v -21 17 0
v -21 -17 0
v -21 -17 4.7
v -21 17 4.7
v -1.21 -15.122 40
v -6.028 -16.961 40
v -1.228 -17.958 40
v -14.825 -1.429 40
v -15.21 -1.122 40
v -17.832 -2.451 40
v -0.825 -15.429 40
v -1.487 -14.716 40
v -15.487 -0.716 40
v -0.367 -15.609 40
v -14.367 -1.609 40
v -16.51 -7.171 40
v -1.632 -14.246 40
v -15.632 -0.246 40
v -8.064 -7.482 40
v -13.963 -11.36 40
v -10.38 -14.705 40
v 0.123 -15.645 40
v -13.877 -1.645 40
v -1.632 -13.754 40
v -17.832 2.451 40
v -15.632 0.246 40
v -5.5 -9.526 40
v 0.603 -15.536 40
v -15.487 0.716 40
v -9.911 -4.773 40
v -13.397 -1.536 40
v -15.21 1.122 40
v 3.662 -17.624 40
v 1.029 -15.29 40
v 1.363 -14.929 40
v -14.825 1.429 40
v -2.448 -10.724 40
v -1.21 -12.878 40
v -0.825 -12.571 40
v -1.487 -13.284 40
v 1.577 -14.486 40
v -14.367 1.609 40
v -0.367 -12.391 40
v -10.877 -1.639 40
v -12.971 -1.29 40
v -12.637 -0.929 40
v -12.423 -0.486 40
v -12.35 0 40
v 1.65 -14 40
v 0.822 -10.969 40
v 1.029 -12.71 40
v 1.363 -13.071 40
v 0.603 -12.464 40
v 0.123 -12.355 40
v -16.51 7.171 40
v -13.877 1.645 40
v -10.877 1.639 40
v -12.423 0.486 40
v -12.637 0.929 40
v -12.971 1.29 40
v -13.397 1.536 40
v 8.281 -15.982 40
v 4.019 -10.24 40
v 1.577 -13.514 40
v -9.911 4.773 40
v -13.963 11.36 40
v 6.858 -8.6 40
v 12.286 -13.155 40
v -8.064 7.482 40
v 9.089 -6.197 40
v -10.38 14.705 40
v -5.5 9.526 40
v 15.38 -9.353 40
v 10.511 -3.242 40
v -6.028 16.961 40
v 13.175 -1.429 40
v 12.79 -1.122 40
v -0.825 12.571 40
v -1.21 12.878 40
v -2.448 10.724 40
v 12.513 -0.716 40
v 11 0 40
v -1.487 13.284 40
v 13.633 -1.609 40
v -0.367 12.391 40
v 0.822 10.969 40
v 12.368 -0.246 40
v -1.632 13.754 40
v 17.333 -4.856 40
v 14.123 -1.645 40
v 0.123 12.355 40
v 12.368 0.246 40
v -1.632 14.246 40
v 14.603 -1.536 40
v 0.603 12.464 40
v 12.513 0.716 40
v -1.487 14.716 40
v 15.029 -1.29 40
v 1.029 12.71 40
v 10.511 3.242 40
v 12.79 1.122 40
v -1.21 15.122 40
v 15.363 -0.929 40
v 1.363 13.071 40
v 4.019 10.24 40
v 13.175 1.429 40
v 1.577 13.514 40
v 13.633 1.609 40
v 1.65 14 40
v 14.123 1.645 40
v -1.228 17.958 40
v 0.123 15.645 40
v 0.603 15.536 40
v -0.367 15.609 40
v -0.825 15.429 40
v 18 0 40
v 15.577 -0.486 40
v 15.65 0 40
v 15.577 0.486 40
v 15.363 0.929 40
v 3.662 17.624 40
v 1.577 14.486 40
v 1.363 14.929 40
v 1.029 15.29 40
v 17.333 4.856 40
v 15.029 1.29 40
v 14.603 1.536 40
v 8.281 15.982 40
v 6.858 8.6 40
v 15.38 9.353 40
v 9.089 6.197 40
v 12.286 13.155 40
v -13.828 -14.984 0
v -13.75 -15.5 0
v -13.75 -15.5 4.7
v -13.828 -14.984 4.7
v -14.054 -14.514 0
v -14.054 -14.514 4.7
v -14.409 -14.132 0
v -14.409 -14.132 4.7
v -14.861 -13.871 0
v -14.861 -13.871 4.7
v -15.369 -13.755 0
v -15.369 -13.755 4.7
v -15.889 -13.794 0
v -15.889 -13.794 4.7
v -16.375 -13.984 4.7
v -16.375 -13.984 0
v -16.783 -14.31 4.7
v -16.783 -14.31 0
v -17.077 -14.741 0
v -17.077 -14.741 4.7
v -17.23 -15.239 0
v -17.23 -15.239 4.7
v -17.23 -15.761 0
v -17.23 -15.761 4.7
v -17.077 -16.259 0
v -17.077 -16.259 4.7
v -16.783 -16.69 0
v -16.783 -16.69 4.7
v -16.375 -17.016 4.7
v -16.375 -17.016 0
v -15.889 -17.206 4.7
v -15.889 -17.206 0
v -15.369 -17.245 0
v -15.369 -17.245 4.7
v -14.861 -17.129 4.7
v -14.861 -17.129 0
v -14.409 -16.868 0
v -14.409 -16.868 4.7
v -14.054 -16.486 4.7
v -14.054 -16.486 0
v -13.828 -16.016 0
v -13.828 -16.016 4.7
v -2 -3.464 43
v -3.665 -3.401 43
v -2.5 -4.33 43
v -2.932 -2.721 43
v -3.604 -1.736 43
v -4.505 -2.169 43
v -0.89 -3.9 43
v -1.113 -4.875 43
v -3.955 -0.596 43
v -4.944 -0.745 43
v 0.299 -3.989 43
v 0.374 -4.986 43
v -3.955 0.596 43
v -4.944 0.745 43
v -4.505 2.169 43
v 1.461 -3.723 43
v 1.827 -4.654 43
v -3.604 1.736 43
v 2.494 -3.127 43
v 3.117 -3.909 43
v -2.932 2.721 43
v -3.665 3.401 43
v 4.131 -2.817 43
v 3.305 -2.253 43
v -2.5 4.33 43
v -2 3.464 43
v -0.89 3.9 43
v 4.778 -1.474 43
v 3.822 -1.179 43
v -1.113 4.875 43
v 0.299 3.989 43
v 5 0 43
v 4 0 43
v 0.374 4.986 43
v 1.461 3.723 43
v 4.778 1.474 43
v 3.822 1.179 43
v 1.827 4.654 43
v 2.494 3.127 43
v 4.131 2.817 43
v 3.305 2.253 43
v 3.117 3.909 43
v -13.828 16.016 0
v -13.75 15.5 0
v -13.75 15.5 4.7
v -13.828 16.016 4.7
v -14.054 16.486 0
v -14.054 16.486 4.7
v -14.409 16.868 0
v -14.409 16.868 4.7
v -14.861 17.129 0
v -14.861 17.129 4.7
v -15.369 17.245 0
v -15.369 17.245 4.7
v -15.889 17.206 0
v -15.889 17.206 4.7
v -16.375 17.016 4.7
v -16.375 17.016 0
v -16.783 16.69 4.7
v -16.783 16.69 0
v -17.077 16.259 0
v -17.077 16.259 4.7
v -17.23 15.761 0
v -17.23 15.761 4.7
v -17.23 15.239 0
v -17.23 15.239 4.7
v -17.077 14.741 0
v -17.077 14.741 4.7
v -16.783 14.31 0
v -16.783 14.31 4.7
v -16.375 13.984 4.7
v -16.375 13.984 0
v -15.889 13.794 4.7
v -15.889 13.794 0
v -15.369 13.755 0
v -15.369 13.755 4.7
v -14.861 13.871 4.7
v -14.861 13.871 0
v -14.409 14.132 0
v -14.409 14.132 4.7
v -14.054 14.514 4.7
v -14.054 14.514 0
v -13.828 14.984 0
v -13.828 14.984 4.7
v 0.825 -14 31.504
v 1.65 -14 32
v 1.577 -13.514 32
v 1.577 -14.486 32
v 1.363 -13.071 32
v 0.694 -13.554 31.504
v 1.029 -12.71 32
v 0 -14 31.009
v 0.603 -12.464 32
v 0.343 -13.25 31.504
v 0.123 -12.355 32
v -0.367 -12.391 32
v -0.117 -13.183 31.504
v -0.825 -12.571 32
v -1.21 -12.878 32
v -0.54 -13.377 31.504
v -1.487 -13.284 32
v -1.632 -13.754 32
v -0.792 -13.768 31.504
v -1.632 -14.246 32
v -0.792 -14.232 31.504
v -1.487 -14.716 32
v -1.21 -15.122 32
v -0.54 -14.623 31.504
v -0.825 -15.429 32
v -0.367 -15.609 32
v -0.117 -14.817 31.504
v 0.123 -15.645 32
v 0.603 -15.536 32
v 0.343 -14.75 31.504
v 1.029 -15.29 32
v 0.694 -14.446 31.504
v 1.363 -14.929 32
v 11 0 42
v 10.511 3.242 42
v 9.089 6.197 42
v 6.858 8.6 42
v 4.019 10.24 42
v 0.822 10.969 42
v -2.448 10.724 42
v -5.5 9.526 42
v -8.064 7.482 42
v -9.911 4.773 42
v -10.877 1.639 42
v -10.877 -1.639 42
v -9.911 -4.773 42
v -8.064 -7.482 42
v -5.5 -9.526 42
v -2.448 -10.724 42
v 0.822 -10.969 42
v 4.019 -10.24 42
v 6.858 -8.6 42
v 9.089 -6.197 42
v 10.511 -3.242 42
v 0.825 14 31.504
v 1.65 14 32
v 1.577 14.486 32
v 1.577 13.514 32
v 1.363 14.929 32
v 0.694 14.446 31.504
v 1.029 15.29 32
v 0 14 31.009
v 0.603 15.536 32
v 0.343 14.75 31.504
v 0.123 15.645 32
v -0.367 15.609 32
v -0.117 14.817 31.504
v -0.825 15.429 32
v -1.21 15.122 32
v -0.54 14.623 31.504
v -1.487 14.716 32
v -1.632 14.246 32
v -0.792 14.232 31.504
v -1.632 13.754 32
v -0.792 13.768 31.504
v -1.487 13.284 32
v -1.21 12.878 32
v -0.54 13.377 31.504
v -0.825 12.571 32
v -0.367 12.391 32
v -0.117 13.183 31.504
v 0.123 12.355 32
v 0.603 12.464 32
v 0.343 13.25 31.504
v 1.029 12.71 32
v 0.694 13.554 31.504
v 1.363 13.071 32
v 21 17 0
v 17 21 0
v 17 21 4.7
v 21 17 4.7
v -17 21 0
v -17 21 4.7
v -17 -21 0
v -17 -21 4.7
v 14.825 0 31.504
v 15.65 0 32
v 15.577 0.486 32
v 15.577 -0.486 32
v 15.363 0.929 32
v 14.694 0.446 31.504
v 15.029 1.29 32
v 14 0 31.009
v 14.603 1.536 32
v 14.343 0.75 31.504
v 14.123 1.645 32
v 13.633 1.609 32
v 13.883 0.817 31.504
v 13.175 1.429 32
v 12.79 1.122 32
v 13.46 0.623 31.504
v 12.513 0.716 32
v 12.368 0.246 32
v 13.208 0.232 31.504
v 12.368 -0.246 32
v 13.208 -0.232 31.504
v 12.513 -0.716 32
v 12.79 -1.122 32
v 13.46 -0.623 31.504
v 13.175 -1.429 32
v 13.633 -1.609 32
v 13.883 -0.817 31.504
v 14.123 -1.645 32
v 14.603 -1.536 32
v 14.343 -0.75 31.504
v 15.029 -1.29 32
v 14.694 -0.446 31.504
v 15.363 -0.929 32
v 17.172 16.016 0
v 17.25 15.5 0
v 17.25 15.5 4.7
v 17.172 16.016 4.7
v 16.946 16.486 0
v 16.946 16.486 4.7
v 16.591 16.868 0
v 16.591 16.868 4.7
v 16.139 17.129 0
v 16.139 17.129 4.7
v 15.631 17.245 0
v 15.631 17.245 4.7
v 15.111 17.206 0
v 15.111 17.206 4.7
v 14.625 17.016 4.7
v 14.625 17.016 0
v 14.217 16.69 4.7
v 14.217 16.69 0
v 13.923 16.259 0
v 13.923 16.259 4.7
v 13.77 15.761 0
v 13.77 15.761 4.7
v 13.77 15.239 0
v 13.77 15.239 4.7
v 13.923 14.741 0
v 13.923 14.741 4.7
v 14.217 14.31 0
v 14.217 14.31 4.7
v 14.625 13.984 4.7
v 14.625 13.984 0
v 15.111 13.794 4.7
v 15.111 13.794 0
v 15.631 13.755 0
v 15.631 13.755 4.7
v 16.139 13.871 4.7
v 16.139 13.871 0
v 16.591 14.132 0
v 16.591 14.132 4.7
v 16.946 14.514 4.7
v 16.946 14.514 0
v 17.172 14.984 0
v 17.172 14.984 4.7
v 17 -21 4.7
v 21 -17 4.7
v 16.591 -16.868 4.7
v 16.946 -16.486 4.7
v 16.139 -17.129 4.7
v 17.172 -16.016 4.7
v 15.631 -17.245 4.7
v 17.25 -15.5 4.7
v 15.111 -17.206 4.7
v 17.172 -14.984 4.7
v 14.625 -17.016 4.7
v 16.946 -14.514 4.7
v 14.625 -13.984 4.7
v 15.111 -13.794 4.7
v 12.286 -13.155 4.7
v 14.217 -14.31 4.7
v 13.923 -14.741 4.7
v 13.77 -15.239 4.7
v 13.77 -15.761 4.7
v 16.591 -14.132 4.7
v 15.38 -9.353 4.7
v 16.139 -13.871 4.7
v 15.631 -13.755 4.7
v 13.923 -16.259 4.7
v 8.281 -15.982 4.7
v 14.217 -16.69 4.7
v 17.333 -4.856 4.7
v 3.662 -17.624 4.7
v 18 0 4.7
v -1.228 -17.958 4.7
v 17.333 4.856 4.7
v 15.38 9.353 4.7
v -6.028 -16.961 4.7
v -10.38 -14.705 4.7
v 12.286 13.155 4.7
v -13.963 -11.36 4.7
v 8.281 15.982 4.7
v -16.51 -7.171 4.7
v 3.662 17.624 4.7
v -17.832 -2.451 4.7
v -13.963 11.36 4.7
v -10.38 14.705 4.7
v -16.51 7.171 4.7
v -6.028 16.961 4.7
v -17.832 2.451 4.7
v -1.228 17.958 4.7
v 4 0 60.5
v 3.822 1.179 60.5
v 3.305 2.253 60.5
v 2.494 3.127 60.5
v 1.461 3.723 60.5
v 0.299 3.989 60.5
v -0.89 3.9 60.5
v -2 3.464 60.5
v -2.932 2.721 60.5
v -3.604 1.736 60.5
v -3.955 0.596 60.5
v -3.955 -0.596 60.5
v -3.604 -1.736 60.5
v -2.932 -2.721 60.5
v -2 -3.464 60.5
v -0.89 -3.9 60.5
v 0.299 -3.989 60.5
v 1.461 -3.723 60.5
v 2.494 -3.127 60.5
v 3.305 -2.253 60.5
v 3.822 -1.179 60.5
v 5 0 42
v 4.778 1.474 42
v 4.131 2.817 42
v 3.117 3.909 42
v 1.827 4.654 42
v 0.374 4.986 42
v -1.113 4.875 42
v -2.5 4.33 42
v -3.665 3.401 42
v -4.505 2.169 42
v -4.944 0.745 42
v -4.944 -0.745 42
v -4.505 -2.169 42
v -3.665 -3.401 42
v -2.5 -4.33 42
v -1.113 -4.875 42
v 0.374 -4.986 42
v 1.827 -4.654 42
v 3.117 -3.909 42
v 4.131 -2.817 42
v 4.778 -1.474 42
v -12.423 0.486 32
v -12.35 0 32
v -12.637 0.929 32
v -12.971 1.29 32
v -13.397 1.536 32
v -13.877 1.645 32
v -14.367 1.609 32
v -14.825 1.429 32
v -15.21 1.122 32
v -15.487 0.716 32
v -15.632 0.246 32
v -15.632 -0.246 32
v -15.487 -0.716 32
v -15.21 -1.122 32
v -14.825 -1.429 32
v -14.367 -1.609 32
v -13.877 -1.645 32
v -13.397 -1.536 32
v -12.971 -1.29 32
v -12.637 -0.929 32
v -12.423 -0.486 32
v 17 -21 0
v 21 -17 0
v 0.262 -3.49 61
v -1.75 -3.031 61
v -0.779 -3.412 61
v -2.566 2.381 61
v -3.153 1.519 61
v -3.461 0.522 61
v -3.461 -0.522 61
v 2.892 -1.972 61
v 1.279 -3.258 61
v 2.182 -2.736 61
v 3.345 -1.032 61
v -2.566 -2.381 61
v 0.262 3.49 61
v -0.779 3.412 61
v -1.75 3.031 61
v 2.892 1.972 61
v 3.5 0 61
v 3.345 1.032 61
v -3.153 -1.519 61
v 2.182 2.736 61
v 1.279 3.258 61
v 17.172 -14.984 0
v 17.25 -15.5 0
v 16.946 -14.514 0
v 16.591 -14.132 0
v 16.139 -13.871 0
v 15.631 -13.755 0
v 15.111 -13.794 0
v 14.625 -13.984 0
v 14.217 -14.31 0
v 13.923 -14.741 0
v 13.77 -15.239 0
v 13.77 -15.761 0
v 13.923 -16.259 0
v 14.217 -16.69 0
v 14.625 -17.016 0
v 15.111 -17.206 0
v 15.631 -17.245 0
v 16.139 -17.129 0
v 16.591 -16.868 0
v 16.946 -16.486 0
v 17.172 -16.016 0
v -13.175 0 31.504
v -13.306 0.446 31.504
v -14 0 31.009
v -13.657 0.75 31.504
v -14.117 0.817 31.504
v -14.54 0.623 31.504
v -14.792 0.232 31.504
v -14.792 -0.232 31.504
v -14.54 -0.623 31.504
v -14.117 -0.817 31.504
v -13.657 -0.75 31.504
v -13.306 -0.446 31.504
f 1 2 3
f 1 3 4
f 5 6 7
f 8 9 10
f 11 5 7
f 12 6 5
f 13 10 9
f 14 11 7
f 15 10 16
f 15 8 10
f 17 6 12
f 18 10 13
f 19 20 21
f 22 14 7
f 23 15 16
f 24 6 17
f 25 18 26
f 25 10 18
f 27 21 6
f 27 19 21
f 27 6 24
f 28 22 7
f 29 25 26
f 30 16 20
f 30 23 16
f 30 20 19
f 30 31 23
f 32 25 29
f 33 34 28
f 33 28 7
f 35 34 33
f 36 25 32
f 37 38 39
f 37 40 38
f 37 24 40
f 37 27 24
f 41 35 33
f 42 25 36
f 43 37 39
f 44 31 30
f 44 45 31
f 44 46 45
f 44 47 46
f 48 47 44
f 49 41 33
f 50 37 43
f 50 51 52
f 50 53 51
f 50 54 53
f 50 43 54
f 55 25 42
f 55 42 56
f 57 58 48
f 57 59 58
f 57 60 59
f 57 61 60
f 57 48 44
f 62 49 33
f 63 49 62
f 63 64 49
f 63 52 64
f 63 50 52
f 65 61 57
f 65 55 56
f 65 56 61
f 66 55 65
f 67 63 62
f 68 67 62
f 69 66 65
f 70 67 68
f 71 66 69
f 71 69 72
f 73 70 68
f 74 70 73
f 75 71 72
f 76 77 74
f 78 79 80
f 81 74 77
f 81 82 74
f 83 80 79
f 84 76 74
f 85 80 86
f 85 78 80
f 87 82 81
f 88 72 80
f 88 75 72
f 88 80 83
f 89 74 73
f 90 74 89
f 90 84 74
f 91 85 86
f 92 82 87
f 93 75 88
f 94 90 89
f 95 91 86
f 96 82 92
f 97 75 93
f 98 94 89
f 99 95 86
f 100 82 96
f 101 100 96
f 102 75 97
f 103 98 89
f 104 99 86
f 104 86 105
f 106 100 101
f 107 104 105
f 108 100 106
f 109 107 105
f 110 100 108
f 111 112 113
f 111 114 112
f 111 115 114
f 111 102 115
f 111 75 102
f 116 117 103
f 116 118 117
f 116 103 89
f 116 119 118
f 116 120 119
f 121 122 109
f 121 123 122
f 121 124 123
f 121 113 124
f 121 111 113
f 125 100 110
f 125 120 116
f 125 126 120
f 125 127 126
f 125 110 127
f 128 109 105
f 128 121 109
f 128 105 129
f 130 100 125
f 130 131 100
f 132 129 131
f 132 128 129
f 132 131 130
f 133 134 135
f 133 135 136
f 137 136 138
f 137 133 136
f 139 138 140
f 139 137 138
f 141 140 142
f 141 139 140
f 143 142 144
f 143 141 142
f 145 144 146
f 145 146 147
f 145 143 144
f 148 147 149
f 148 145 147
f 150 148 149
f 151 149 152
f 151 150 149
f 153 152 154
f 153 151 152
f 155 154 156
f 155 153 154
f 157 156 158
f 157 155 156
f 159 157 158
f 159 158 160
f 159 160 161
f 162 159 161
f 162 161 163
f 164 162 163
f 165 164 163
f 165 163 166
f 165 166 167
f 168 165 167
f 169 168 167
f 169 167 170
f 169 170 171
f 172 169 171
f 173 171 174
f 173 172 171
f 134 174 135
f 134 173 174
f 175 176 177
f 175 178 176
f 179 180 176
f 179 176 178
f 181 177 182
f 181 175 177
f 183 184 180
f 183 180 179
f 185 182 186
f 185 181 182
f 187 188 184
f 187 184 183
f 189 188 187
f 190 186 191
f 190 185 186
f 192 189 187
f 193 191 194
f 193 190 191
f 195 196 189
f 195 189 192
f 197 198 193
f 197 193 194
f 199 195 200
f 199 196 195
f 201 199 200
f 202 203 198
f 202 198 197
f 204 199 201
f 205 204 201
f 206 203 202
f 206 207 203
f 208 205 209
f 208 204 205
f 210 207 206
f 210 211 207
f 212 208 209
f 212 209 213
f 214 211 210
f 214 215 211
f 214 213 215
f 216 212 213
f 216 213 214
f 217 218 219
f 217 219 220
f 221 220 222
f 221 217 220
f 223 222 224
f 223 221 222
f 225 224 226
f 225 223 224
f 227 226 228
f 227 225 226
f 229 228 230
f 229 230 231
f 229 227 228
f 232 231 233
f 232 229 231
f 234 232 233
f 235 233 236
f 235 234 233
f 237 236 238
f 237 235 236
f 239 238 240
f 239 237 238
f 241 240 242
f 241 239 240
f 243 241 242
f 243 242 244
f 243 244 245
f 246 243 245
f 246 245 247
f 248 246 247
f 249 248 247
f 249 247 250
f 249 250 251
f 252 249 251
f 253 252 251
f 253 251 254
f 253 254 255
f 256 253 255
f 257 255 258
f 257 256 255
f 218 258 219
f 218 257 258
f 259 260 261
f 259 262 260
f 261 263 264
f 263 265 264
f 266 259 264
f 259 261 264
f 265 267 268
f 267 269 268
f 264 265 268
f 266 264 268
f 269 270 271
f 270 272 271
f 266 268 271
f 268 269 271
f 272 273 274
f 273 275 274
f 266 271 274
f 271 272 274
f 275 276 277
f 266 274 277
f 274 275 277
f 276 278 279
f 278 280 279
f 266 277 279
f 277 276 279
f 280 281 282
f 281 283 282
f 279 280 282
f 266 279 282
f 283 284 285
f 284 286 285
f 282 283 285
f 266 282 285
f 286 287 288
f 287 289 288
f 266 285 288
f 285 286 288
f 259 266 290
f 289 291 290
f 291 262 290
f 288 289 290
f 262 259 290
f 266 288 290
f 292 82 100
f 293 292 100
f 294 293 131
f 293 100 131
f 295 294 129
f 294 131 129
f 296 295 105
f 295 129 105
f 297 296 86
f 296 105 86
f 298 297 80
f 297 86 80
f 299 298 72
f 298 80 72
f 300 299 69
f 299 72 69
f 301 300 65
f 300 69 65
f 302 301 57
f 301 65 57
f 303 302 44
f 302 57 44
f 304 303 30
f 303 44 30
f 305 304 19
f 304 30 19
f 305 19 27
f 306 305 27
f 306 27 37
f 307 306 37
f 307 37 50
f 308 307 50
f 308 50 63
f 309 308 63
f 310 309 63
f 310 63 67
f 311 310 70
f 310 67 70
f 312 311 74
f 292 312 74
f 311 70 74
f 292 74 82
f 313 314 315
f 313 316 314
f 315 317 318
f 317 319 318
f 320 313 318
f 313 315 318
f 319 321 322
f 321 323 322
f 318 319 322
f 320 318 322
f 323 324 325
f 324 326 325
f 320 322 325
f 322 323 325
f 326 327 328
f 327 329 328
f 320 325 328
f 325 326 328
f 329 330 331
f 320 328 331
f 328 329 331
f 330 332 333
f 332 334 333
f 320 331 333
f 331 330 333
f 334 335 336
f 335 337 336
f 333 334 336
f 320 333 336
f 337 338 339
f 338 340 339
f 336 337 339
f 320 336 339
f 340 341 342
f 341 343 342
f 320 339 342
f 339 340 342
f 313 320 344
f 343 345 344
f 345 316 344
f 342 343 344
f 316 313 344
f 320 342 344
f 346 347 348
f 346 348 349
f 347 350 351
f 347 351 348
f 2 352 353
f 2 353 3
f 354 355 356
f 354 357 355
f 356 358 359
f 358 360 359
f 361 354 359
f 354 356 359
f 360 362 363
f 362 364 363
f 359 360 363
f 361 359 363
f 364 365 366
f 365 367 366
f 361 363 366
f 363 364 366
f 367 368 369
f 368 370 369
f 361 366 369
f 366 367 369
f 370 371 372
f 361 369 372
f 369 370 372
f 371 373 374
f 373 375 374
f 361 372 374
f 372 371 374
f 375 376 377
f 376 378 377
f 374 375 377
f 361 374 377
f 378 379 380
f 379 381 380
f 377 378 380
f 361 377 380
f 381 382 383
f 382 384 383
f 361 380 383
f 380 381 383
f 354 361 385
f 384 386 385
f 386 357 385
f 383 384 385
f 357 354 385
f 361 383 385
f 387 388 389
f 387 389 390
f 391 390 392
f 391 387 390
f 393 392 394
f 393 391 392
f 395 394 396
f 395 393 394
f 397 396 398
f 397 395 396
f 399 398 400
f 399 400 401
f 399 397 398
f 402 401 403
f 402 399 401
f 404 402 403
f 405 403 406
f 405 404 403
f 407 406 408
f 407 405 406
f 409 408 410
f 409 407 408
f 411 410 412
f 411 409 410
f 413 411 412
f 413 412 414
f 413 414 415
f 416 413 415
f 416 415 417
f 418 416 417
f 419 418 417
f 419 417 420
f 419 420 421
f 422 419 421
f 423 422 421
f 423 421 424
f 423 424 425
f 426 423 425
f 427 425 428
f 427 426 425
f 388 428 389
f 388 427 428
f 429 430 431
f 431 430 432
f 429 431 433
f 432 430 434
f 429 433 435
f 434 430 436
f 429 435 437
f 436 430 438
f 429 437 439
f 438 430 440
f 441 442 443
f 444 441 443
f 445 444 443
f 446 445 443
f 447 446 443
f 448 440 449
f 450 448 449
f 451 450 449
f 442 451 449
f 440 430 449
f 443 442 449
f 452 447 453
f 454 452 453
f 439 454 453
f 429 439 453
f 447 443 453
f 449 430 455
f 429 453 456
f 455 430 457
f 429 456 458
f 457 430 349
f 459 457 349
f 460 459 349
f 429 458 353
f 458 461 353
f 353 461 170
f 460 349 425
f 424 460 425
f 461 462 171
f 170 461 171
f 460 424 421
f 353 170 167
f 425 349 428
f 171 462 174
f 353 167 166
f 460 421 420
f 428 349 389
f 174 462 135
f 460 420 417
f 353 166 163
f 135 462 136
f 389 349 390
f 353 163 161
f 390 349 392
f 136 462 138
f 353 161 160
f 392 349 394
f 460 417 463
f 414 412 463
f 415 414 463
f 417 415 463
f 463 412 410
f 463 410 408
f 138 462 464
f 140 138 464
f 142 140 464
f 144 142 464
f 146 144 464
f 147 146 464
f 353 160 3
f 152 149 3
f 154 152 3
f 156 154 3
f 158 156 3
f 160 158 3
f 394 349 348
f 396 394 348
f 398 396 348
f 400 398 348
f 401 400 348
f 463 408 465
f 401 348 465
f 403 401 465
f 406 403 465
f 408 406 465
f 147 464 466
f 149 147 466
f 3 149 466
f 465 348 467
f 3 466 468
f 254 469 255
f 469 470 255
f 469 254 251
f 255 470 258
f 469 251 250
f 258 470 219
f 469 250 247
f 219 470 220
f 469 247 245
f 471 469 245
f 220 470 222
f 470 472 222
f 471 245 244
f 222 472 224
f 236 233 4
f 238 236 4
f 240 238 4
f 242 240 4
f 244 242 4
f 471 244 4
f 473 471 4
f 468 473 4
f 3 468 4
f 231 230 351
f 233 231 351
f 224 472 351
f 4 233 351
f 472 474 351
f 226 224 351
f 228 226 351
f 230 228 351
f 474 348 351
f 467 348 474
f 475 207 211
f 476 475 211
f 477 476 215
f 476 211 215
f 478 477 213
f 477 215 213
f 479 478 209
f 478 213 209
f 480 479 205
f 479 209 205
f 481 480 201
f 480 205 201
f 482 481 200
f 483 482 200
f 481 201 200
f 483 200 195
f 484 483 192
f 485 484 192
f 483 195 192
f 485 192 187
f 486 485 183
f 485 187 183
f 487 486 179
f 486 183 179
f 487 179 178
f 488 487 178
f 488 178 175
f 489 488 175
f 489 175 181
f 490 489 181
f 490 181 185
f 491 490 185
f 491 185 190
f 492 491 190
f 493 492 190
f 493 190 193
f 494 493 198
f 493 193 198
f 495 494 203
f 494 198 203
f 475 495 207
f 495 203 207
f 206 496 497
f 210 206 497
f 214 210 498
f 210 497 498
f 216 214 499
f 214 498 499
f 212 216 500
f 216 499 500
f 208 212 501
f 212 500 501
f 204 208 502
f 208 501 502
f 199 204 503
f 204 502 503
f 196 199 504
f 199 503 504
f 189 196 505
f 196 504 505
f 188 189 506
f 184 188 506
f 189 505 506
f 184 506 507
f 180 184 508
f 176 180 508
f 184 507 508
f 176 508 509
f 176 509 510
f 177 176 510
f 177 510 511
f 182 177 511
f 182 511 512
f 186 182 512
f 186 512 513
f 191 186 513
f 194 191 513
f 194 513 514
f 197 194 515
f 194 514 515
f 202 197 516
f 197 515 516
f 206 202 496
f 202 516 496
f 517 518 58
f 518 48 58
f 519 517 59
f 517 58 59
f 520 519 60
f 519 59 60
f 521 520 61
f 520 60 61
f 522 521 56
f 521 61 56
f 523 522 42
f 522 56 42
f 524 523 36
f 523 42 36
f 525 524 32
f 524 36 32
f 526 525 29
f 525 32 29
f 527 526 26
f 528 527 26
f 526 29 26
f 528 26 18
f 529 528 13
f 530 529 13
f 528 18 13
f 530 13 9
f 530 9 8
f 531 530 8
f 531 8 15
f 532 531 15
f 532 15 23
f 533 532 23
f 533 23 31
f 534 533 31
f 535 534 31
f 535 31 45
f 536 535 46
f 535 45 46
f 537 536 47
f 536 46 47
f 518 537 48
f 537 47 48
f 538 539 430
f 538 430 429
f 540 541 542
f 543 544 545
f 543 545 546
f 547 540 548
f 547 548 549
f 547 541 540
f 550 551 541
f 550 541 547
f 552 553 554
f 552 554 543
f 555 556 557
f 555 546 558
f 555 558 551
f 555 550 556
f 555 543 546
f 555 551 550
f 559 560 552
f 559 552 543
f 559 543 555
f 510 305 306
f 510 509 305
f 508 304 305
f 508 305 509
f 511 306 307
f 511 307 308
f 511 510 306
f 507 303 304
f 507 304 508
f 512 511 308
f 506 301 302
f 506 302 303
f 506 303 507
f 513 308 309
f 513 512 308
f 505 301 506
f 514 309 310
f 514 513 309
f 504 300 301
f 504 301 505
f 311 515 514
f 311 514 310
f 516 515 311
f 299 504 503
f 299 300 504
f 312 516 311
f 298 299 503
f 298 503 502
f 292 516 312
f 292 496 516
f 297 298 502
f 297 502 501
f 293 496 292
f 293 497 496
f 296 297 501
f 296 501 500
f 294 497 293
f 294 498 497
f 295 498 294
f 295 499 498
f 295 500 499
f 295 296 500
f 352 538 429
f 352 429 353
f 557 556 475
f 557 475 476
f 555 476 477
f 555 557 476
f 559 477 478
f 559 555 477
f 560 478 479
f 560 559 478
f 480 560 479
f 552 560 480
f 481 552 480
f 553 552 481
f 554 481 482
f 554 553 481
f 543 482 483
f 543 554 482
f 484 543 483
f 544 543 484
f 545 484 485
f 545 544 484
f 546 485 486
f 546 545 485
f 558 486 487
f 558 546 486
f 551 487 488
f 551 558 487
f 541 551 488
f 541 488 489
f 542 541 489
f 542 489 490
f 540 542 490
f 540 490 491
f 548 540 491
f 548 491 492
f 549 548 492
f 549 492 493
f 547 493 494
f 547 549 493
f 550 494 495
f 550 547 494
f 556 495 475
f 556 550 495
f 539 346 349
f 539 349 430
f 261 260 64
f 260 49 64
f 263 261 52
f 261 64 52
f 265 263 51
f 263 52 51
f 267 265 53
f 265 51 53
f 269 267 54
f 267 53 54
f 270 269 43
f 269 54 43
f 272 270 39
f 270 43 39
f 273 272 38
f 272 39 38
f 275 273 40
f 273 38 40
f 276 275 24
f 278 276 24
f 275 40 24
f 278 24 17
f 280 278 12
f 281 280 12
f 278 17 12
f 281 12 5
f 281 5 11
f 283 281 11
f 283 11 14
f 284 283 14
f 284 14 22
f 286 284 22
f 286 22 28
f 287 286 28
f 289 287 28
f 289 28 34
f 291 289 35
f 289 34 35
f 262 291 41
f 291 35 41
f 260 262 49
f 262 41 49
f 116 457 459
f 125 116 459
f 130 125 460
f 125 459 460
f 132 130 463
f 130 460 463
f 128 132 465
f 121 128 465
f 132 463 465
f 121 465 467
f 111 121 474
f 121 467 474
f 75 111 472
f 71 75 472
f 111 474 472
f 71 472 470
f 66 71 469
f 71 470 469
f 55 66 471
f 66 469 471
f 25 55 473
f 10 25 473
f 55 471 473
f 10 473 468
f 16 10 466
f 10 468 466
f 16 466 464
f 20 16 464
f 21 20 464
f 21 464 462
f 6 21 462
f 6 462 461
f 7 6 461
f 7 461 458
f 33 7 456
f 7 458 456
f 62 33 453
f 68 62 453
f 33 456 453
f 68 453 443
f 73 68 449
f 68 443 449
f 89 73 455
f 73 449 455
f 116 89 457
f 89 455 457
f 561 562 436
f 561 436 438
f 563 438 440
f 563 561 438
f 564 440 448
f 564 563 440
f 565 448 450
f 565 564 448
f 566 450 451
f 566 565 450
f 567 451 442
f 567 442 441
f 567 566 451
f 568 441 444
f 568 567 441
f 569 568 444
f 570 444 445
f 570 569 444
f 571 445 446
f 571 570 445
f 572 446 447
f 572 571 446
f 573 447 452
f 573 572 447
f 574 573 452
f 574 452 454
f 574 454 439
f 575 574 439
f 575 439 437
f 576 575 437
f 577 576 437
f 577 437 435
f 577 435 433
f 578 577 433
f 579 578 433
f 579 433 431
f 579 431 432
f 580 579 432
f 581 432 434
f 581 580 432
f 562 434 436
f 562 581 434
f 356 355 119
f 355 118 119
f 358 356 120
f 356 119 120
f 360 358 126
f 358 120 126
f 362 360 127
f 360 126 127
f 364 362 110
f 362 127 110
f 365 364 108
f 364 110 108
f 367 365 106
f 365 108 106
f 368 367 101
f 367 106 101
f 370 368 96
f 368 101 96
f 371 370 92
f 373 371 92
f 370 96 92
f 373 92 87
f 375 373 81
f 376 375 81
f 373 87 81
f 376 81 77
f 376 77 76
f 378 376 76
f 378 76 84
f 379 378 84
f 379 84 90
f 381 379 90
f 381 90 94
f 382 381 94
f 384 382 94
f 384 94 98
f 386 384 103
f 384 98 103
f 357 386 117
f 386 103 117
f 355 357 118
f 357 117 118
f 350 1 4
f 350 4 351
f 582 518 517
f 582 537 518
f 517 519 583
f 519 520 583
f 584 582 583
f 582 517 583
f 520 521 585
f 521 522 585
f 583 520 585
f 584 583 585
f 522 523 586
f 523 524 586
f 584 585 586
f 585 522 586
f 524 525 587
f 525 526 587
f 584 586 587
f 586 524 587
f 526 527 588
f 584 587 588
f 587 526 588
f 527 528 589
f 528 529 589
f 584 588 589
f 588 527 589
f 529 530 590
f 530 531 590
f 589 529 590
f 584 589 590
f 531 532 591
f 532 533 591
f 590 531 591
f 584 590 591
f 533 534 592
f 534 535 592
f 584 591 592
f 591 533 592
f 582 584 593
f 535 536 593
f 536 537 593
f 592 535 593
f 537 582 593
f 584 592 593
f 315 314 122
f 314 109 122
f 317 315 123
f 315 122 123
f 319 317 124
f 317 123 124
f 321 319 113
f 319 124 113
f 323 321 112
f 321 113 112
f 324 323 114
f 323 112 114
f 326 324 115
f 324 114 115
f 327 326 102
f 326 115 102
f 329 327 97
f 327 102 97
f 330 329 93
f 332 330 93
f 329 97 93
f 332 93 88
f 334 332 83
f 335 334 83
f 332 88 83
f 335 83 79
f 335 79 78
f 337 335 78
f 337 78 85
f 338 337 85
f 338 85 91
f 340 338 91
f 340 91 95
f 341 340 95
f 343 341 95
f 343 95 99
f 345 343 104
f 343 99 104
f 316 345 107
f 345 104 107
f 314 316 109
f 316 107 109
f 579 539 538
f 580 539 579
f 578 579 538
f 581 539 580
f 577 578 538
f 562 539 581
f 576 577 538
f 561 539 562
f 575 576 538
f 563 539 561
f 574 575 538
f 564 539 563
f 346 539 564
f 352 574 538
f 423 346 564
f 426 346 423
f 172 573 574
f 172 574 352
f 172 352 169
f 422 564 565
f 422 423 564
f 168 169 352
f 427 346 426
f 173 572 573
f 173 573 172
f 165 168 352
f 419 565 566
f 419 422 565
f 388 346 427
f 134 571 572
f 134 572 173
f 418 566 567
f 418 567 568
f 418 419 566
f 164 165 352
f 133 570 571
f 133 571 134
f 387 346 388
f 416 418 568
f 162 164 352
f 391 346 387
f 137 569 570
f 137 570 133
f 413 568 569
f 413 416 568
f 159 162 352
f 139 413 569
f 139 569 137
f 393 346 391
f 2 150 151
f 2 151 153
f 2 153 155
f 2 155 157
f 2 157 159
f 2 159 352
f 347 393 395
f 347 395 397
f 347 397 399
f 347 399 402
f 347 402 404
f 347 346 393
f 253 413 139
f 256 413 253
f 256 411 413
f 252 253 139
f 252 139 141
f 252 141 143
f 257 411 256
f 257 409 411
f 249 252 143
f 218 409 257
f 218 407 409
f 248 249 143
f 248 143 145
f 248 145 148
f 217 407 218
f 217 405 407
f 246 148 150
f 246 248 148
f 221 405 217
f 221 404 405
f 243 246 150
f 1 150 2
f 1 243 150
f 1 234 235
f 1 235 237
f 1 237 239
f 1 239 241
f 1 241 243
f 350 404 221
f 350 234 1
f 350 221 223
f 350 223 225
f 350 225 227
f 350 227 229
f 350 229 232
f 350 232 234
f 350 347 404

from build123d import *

# Parameters (mm, degrees)
BOSS_EXTRUDE1_DEPTH                = 4.7
SKETCH2_R                          = 18
BOSS_EXTRUDE2_DEPTH                = 35.3
F_3_5_3_5_DIAMETER_HOLE1_OUTLINE_R = 1.75
F_3_5_3_5_DIAMETER_HOLE1_DEPTH     = 4.7
SKETCH9_R                          = 11
BOSS_EXTRUDE3_DEPTH                = 2
SKETCH10_R                         = 5
BOSS_EXTRUDE4_DEPTH                = 1
SKETCH11_R                         = 4
BOSS_EXTRUDE5_DEPTH                = 18
CHAMFER1_SIZE                      = 0.5


# Read off the part's stored shape, not the designer's step: Ø3.5 (3.5) Diameter Hole1, Tap Drill for M4x0.7 Tap1
with BuildPart() as part:
    # Sketch1 → Boss-Extrude1 (new body)
    with BuildSketch(Plane.XY):
        Polygon((-21, 17), (-17, 21), (17, 21), (21, 17), (21, -17), (17, -21), (-17, -21), (-21, -17), align=None)
    extrude(amount=BOSS_EXTRUDE1_DEPTH)

    # Sketch2 → Boss-Extrude2 (add)
    with BuildSketch(Plane.XY.offset(4.7)):
        Circle(SKETCH2_R)
    extrude(amount=BOSS_EXTRUDE2_DEPTH)

    # Ø3.5 (3.5) Diameter Hole1 outline → Ø3.5 (3.5) Diameter Hole1 (cut)
    with BuildSketch(Plane.XY):
        with Locations((-15.5, 15.5)):
            Circle(F_3_5_3_5_DIAMETER_HOLE1_OUTLINE_R)
        with Locations((15.5, -15.5)):
            Circle(F_3_5_3_5_DIAMETER_HOLE1_OUTLINE_R)
        with Locations((15.5, 15.5)):
            Circle(F_3_5_3_5_DIAMETER_HOLE1_OUTLINE_R)
        with Locations((-15.5, -15.5)):
            Circle(F_3_5_3_5_DIAMETER_HOLE1_OUTLINE_R)
    extrude(amount=F_3_5_3_5_DIAMETER_HOLE1_DEPTH, mode=Mode.SUBTRACT)

    # Tap Drill for M4x0.7 Tap1 outline → Tap Drill for M4x0.7 Tap1 (revolve, cut)
    with BuildSketch(Plane(origin=(14, 0, 0), x_dir=(1, 0, 0), z_dir=(0, -1, 0))):
        Polygon((0, 40), (0, 31.008579979), (1.65, 32), (1.65, 40), align=None)
    revolve(axis=Axis((14, 0, 0), (0, 0, 1)), mode=Mode.SUBTRACT)

    # Tap Drill for M4x0.7 Tap1 2 outline → Tap Drill for M4x0.7 Tap1 2 (revolve, cut)
    with BuildSketch(Plane(origin=(-14, 0, 0), x_dir=(1, 0, 0), z_dir=(0, -1, 0))):
        Polygon((0, 40), (0, 31.008579979), (1.65, 32), (1.65, 40), align=None)
    revolve(axis=Axis((-14, 0, 0), (0, 0, 1)), mode=Mode.SUBTRACT)

    # Tap Drill for M4x0.7 Tap1 3 outline → Tap Drill for M4x0.7 Tap1 3 (revolve, cut)
    with BuildSketch(Plane.XZ.offset(14)):
        Polygon((0, 40), (0, 31.008579979), (1.65, 32), (1.65, 40), align=None)
    revolve(axis=Axis((0, -14, 0), (0, 0, 1)), mode=Mode.SUBTRACT)

    # Tap Drill for M4x0.7 Tap1 4 outline → Tap Drill for M4x0.7 Tap1 4 (revolve, cut)
    with BuildSketch(Plane.XZ.offset(-14)):
        Polygon((0, 40), (0, 31.008579979), (1.65, 32), (1.65, 40), align=None)
    revolve(axis=Axis((0, 14, 0), (0, 0, 1)), mode=Mode.SUBTRACT)

    # Sketch9 → Boss-Extrude3 (add)
    with BuildSketch(Plane.XY.offset(40)):
        Circle(SKETCH9_R)
    extrude(amount=BOSS_EXTRUDE3_DEPTH)

    # Sketch10 → Boss-Extrude4 (add)
    with BuildSketch(Plane.XY.offset(42)):
        Circle(SKETCH10_R)
    extrude(amount=BOSS_EXTRUDE4_DEPTH)

    # Sketch11 → Boss-Extrude5 (add)
    with BuildSketch(Plane.XY.offset(43)):
        Circle(SKETCH11_R)
    extrude(amount=BOSS_EXTRUDE5_DEPTH)

    # Chamfer1
    chamfer1_edges = [part.edges().sort_by_distance(p)[0] for p in [
        (-4, 0, 61),
    ]]
    chamfer(chamfer1_edges, length=CHAMFER1_SIZE)


solid = part.part
